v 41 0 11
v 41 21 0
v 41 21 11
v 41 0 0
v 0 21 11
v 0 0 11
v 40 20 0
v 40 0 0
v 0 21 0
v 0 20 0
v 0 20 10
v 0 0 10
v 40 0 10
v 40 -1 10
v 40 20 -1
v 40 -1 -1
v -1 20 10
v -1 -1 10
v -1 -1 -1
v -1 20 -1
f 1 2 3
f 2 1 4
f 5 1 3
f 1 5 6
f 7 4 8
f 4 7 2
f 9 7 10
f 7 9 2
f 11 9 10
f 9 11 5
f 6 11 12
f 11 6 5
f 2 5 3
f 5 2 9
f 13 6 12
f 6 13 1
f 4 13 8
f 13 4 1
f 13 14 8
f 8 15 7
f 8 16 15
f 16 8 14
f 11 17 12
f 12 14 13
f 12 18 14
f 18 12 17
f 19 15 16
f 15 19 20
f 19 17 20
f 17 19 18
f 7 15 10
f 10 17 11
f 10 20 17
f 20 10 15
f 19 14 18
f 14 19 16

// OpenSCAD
// Unit of length: Unit.MM
union()
{
   color(c = [1.0, 0.0, 0.0, 1.0])
   {
      cube(size = [41.0, 21.0, 11.0], center = false);
   }
   translate(v = [-1.0, -1.0, -1.0])
   {
      cube(size = [41.0, 21.0, 11.0], center = false);
   }
}
